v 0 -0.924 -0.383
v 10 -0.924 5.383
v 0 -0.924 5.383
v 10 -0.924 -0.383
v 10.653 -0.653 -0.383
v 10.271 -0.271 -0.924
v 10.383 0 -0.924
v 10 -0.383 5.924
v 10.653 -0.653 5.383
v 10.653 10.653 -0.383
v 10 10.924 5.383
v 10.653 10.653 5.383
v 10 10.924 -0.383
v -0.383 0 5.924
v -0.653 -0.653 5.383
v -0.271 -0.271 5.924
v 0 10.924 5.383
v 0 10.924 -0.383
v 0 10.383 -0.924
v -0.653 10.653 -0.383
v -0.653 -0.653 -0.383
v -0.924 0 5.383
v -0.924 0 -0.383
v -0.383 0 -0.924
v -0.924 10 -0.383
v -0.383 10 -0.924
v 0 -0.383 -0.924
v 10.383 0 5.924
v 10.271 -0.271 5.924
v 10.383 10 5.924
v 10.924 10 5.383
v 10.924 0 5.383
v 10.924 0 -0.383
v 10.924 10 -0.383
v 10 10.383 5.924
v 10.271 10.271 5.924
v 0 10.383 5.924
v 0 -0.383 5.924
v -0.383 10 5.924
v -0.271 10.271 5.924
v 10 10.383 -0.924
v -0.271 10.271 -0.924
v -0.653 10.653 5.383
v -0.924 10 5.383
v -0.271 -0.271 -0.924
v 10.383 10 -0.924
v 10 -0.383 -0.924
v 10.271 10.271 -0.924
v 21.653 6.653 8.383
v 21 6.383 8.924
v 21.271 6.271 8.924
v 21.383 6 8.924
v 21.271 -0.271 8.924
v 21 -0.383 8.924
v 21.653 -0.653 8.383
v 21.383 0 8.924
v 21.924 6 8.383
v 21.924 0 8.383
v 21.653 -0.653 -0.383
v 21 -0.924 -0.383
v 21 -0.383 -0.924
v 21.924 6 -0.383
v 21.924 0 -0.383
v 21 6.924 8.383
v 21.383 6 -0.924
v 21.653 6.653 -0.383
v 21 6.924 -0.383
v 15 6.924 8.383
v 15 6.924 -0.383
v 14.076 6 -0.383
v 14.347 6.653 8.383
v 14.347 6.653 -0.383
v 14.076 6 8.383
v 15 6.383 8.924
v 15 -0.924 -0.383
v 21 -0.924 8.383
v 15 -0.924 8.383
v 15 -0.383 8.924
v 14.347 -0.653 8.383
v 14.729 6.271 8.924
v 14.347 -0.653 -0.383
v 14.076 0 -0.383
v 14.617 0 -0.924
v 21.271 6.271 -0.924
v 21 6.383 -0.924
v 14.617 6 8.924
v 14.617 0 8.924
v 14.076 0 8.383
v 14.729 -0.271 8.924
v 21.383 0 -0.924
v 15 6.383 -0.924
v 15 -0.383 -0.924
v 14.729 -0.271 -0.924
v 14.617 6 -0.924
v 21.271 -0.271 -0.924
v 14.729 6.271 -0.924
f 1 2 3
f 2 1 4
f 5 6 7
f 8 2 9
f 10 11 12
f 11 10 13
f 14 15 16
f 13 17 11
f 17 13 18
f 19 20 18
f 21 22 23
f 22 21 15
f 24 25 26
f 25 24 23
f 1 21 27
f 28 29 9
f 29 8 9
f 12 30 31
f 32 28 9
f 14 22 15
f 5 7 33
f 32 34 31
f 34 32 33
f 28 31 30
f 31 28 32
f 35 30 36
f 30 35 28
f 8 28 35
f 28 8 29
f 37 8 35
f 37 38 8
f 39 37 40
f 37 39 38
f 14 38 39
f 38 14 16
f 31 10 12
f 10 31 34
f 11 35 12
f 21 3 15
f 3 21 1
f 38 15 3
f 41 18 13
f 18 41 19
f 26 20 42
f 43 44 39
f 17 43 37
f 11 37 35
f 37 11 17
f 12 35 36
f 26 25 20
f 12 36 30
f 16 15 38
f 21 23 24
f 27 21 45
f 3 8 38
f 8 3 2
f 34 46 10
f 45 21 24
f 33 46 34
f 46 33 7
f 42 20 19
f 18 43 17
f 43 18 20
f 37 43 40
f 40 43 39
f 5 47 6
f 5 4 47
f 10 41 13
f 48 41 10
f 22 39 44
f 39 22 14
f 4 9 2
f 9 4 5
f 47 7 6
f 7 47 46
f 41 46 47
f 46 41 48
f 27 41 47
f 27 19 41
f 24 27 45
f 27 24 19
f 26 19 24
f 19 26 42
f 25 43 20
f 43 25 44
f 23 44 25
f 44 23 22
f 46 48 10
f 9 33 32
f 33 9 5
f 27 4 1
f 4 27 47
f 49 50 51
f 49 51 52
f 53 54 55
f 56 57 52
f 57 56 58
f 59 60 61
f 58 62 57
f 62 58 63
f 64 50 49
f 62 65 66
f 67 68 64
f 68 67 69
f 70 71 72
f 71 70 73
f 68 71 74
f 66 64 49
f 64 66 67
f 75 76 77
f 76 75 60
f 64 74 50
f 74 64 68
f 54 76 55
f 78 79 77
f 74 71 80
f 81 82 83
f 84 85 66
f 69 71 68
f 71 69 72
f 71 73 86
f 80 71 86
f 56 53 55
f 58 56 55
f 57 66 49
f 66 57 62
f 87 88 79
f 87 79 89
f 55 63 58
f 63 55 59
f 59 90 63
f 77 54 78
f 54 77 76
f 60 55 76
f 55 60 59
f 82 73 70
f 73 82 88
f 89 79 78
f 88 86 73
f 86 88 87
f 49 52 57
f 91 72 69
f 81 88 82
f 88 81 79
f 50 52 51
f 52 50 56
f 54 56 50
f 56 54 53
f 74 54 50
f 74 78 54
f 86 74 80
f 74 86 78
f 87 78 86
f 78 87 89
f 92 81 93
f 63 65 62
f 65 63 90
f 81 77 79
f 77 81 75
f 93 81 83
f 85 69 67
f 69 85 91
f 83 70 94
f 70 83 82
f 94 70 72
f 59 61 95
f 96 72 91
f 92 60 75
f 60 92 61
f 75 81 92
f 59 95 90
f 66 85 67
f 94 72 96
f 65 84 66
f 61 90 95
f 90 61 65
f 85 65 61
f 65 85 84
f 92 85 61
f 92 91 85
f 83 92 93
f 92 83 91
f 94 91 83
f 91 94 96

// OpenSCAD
// Generated by scadwright. Do not hand-edit —
// edit the Python source and regenerate.

module chamfer_top_655a5176(depth) {
    minkowski() {
        children();
        sphere(r=1, $fn=8);
    }
}

union() {
    chamfer_top_655a5176(depth=1) {
        cube([10, 10, 5], center=false);
    }

    chamfer_top_655a5176(depth=1) {
        translate([15, 0, 0]) {
            cube([6, 6, 8], center=false);
        }
    }
}
